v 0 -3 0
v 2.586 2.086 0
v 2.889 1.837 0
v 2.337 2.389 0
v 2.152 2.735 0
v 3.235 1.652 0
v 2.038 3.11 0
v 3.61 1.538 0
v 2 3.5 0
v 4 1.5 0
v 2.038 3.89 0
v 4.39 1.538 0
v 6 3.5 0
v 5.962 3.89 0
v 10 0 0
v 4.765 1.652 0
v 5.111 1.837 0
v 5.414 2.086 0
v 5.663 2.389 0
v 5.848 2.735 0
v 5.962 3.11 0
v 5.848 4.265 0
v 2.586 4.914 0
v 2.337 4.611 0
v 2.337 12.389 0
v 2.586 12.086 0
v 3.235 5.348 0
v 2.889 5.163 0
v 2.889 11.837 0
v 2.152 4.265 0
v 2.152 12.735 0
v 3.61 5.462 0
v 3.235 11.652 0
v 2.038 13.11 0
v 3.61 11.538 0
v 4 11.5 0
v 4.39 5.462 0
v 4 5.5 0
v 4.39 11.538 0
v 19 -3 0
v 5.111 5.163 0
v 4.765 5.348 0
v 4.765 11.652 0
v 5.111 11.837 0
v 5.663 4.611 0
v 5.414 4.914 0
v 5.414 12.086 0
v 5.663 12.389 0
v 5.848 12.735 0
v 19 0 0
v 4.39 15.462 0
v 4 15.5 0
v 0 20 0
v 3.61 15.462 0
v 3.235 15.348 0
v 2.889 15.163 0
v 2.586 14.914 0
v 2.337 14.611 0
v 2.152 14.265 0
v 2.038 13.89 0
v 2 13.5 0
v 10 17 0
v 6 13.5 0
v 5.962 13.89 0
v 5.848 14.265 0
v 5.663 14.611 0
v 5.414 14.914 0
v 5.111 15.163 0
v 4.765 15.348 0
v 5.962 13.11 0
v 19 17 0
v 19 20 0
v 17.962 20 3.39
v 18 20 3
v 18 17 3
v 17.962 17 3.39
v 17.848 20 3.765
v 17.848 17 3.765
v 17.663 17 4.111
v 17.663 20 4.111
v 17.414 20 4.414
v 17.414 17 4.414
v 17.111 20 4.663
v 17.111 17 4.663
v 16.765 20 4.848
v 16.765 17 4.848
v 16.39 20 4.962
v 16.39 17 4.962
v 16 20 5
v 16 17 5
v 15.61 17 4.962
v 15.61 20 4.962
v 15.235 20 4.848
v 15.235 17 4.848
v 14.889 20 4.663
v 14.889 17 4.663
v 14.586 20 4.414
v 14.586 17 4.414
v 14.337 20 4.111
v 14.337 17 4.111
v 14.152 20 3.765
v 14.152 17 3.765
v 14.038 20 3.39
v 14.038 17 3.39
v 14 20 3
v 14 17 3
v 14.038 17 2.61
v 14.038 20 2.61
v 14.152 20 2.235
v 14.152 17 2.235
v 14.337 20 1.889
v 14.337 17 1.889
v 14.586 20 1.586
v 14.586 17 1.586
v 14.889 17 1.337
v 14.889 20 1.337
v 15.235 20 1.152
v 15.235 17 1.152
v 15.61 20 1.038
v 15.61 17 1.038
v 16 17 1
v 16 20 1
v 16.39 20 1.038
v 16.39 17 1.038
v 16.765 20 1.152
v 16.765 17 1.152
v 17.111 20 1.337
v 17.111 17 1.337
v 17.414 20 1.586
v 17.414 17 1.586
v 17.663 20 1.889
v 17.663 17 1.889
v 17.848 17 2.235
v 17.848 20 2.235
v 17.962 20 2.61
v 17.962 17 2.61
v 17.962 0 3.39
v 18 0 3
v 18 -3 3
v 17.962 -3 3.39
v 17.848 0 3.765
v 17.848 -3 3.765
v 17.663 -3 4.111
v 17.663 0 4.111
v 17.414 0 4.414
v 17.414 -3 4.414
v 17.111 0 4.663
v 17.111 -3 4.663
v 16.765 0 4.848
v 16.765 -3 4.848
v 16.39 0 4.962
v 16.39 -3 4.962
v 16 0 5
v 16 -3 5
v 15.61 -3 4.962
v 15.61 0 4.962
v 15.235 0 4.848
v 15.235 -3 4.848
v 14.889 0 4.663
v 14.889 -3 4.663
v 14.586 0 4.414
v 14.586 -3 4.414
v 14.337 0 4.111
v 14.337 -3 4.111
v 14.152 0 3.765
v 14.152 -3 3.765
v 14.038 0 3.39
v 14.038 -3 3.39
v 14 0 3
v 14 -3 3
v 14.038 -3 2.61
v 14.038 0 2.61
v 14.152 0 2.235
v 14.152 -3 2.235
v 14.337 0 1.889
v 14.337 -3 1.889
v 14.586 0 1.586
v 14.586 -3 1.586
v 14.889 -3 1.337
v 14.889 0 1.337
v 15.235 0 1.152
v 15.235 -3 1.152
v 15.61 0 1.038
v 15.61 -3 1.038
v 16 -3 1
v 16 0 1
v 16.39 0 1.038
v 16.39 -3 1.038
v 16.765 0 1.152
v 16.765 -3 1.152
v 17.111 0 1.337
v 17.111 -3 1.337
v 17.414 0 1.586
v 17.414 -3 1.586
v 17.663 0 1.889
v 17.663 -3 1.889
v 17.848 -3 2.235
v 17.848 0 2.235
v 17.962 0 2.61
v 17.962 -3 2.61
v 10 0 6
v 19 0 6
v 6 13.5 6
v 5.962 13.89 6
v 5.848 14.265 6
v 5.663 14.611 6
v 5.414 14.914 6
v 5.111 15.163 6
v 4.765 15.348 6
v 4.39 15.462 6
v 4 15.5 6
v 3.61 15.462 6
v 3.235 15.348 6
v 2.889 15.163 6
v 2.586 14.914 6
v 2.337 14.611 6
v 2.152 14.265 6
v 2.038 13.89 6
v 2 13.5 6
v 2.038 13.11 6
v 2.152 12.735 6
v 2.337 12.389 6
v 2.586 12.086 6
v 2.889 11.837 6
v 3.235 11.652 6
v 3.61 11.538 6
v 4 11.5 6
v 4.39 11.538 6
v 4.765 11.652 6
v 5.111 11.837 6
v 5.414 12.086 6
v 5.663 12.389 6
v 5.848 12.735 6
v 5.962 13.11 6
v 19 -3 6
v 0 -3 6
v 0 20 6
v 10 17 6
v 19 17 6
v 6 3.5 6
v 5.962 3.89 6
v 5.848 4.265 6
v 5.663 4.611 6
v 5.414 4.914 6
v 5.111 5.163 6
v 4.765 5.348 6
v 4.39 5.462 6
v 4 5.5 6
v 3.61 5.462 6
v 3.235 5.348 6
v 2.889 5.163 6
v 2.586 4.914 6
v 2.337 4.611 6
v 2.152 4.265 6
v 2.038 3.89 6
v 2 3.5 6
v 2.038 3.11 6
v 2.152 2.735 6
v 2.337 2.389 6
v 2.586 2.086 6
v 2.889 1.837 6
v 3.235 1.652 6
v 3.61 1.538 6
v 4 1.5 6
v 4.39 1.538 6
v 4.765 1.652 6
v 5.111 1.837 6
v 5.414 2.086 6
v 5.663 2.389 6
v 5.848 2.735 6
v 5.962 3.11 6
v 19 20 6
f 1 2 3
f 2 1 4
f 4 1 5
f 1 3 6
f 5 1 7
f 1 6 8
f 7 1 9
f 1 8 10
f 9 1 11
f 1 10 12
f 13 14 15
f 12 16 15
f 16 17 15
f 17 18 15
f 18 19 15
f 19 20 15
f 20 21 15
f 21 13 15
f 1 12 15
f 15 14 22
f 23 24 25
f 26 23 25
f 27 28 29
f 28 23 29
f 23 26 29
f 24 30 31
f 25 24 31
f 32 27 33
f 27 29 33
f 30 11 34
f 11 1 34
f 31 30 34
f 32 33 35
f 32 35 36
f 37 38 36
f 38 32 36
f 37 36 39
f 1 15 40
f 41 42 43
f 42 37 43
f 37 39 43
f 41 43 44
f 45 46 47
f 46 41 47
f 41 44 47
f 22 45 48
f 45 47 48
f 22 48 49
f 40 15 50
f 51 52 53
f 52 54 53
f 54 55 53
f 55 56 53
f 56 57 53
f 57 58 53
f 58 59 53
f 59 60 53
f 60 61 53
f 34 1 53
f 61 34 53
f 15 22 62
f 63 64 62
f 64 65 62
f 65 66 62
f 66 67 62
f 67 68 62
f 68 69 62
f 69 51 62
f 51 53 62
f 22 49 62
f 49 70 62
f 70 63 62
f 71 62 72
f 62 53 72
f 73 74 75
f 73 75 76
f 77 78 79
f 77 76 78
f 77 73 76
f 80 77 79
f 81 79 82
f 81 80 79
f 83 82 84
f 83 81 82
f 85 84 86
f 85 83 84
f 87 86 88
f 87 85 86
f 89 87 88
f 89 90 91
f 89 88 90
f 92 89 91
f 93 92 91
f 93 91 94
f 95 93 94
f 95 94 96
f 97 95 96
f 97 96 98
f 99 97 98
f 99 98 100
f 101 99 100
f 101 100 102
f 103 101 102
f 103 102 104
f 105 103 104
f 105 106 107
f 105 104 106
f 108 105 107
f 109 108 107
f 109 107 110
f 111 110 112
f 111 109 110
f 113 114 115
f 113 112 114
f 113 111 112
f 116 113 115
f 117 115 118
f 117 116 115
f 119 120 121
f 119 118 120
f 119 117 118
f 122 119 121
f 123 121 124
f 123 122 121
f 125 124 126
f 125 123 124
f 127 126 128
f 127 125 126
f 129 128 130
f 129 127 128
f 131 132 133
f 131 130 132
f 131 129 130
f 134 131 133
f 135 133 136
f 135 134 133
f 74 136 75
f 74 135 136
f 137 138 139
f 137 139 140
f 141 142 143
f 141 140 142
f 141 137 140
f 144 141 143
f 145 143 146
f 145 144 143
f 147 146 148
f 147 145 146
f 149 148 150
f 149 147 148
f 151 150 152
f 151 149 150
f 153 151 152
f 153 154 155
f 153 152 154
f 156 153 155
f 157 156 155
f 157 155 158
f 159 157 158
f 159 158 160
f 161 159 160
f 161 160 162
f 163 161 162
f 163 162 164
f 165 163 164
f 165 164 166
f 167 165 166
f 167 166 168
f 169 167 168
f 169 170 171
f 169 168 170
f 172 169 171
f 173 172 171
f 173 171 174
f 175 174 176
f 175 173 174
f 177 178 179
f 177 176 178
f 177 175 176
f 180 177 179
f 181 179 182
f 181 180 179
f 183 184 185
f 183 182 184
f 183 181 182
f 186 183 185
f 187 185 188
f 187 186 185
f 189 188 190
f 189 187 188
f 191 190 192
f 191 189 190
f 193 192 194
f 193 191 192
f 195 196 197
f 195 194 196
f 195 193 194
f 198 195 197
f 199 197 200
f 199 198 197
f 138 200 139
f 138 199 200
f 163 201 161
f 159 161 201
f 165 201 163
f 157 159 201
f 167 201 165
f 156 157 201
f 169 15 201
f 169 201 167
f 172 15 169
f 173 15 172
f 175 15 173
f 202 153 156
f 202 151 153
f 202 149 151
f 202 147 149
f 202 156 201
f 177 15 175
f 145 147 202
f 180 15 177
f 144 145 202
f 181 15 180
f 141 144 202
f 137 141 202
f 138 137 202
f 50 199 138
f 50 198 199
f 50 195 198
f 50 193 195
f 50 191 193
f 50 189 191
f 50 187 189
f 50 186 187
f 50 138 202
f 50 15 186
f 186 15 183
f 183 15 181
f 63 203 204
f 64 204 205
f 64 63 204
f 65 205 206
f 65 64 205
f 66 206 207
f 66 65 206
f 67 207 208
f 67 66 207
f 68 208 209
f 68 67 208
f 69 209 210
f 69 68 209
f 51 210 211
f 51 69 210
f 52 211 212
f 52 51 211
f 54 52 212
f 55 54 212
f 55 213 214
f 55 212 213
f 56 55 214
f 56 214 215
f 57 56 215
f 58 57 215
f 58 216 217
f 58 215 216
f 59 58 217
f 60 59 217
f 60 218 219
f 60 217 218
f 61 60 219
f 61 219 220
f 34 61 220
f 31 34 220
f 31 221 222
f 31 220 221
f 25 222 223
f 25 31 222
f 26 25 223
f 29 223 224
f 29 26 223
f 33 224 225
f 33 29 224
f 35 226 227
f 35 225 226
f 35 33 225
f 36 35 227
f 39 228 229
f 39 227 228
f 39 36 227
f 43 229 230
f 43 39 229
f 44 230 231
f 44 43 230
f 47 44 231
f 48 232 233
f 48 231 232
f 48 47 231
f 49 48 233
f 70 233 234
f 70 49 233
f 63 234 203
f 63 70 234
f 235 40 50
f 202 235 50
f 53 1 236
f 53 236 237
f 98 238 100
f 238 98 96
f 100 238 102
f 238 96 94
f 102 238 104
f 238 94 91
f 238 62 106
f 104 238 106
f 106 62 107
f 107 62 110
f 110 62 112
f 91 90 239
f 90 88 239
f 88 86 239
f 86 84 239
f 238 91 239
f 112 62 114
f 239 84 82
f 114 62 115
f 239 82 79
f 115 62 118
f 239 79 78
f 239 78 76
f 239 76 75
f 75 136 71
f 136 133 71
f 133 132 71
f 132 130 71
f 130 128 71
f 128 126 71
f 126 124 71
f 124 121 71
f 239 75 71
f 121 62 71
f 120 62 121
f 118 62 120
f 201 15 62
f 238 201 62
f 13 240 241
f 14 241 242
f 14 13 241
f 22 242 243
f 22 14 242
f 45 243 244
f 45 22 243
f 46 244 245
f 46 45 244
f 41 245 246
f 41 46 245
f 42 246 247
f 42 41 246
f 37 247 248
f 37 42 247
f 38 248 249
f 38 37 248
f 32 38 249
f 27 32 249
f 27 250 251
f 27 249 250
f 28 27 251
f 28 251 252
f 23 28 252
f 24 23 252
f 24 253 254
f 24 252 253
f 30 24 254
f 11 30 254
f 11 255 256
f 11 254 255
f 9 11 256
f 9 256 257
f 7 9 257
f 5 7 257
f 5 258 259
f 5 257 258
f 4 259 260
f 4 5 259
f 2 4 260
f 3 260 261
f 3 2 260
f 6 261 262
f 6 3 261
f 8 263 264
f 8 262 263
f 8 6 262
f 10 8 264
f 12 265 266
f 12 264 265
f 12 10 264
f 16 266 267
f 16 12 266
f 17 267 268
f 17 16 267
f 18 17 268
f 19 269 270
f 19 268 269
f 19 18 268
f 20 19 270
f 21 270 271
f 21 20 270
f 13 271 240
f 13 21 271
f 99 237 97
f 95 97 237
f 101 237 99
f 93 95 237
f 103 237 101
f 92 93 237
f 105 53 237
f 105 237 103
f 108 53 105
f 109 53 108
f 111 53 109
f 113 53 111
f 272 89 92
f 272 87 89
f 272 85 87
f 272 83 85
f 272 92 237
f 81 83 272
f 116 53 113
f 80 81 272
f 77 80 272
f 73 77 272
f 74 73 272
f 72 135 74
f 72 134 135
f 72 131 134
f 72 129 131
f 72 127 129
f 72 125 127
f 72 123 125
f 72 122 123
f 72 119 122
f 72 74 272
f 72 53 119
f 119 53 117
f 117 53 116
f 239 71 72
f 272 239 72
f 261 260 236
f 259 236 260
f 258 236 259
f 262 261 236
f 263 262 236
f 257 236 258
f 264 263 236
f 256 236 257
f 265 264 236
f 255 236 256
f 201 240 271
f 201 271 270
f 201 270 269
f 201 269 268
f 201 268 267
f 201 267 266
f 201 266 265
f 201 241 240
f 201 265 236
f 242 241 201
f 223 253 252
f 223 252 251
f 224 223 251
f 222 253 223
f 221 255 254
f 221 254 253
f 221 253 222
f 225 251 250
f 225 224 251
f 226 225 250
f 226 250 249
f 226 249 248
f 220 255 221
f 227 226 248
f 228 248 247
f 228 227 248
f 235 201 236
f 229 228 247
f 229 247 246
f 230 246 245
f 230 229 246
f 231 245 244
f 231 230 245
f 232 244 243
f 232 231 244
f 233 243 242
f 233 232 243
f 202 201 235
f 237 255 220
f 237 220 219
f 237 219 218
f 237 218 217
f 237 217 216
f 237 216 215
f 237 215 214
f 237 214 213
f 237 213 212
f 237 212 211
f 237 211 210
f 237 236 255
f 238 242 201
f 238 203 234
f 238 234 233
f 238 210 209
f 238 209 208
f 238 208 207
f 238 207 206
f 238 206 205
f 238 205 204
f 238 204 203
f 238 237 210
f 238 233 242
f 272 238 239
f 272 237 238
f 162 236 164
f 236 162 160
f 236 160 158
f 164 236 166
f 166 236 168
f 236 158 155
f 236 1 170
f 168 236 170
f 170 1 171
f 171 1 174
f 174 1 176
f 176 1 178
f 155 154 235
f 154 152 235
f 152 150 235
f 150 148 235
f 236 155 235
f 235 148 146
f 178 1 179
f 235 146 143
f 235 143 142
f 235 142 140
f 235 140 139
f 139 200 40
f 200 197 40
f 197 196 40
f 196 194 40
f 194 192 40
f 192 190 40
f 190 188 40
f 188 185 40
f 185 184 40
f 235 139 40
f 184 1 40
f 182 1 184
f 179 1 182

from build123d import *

# Parameters (mm, degrees)
CYLINDER003_R          = 2
CYLINDER003_DEPTH      = 25
CYLINDER003_ROLL_ANGLE = 90
BOX001_W               = 19
BOX001_H               = 3
BOX001_DEPTH           = 6
BOX002_W               = 19
BOX002_H               = 3
BOX002_DEPTH           = 6
CYLINDER002_R          = 2
CYLINDER002_DEPTH      = 10
CYLINDER001_R          = 2
CYLINDER001_DEPTH      = 10
CYLINDER_R             = 2
CYLINDER_DEPTH         = 10
BOX_W                  = 10
BOX_H                  = 17
BOX_DEPTH              = 6


with BuildPart() as cylinder003:
    # Cylinder003 → Cylinder003 (new body)
    with BuildSketch(Plane.XY):
        Circle(CYLINDER003_R)
    extrude(amount=CYLINDER003_DEPTH)


with BuildPart() as cylinder003_1:
    # Cylinder003 roll: moved
    add(cylinder003.part.rotate(Axis((0, 0, 0), (1, 0, 0)), CYLINDER003_ROLL_ANGLE))


with BuildPart() as cylinder003_2:
    # Cylinder003 placement: moved
    add(cylinder003_1.part.moved(Location((16, 21, 3))))


with BuildPart() as cube001:
    # Box001 → Box001 (new body)
    with BuildSketch(Plane(origin=(0, -3, 0), x_dir=(1, 0, 0), z_dir=(0, 0, 1))):
        with Locations((9.5, 1.5)):
            Rectangle(BOX001_W, BOX001_H)
    extrude(amount=BOX001_DEPTH)


with BuildPart() as cube002:
    # Box002 → Box002 (new body)
    with BuildSketch(Plane(origin=(0, 17, 0), x_dir=(1, 0, 0), z_dir=(0, 0, 1))):
        with Locations((9.5, 1.5)):
            Rectangle(BOX002_W, BOX002_H)
    extrude(amount=BOX002_DEPTH)


with BuildPart() as cylinder002:
    # Cylinder002 → Cylinder002 (new body)
    with BuildSketch(Plane(origin=(4, 13.5, 0), x_dir=(1, 0, 0), z_dir=(0, 0, 1))):
        Circle(CYLINDER002_R)
    extrude(amount=CYLINDER002_DEPTH)


with BuildPart() as cylinder001:
    # Cylinder001 → Cylinder001 (new body)
    with BuildSketch(Plane(origin=(4, 3.5, 0), x_dir=(1, 0, 0), z_dir=(0, 0, 1))):
        Circle(CYLINDER001_R)
    extrude(amount=CYLINDER001_DEPTH)


with BuildPart() as cylinder:
    # Cylinder → Cylinder (new body)
    with BuildSketch(Plane(origin=(4, 3.5, 0), x_dir=(1, 0, 0), z_dir=(0, 0, 1))):
        Circle(CYLINDER_R)
    extrude(amount=CYLINDER_DEPTH)


with BuildPart() as cut003:
    # Box → Box (new body)
    with BuildSketch(Plane.XY):
        with Locations((5, 8.5)):
            Rectangle(BOX_W, BOX_H)
    extrude(amount=BOX_DEPTH)

    # Cut: cut Cylinder
    add(cylinder.part, mode=Mode.SUBTRACT)

    # Cut001: cut Cylinder001
    add(cylinder001.part, mode=Mode.SUBTRACT)

    # Cut002: cut Cylinder002
    add(cylinder002.part, mode=Mode.SUBTRACT)

    # Fusion: union Cube001, Cube002
    add(cube001.part)
    add(cube002.part)

    # Cut003: cut Cylinder003
    add(cylinder003_2.part, mode=Mode.SUBTRACT)


solid = cut003.part
